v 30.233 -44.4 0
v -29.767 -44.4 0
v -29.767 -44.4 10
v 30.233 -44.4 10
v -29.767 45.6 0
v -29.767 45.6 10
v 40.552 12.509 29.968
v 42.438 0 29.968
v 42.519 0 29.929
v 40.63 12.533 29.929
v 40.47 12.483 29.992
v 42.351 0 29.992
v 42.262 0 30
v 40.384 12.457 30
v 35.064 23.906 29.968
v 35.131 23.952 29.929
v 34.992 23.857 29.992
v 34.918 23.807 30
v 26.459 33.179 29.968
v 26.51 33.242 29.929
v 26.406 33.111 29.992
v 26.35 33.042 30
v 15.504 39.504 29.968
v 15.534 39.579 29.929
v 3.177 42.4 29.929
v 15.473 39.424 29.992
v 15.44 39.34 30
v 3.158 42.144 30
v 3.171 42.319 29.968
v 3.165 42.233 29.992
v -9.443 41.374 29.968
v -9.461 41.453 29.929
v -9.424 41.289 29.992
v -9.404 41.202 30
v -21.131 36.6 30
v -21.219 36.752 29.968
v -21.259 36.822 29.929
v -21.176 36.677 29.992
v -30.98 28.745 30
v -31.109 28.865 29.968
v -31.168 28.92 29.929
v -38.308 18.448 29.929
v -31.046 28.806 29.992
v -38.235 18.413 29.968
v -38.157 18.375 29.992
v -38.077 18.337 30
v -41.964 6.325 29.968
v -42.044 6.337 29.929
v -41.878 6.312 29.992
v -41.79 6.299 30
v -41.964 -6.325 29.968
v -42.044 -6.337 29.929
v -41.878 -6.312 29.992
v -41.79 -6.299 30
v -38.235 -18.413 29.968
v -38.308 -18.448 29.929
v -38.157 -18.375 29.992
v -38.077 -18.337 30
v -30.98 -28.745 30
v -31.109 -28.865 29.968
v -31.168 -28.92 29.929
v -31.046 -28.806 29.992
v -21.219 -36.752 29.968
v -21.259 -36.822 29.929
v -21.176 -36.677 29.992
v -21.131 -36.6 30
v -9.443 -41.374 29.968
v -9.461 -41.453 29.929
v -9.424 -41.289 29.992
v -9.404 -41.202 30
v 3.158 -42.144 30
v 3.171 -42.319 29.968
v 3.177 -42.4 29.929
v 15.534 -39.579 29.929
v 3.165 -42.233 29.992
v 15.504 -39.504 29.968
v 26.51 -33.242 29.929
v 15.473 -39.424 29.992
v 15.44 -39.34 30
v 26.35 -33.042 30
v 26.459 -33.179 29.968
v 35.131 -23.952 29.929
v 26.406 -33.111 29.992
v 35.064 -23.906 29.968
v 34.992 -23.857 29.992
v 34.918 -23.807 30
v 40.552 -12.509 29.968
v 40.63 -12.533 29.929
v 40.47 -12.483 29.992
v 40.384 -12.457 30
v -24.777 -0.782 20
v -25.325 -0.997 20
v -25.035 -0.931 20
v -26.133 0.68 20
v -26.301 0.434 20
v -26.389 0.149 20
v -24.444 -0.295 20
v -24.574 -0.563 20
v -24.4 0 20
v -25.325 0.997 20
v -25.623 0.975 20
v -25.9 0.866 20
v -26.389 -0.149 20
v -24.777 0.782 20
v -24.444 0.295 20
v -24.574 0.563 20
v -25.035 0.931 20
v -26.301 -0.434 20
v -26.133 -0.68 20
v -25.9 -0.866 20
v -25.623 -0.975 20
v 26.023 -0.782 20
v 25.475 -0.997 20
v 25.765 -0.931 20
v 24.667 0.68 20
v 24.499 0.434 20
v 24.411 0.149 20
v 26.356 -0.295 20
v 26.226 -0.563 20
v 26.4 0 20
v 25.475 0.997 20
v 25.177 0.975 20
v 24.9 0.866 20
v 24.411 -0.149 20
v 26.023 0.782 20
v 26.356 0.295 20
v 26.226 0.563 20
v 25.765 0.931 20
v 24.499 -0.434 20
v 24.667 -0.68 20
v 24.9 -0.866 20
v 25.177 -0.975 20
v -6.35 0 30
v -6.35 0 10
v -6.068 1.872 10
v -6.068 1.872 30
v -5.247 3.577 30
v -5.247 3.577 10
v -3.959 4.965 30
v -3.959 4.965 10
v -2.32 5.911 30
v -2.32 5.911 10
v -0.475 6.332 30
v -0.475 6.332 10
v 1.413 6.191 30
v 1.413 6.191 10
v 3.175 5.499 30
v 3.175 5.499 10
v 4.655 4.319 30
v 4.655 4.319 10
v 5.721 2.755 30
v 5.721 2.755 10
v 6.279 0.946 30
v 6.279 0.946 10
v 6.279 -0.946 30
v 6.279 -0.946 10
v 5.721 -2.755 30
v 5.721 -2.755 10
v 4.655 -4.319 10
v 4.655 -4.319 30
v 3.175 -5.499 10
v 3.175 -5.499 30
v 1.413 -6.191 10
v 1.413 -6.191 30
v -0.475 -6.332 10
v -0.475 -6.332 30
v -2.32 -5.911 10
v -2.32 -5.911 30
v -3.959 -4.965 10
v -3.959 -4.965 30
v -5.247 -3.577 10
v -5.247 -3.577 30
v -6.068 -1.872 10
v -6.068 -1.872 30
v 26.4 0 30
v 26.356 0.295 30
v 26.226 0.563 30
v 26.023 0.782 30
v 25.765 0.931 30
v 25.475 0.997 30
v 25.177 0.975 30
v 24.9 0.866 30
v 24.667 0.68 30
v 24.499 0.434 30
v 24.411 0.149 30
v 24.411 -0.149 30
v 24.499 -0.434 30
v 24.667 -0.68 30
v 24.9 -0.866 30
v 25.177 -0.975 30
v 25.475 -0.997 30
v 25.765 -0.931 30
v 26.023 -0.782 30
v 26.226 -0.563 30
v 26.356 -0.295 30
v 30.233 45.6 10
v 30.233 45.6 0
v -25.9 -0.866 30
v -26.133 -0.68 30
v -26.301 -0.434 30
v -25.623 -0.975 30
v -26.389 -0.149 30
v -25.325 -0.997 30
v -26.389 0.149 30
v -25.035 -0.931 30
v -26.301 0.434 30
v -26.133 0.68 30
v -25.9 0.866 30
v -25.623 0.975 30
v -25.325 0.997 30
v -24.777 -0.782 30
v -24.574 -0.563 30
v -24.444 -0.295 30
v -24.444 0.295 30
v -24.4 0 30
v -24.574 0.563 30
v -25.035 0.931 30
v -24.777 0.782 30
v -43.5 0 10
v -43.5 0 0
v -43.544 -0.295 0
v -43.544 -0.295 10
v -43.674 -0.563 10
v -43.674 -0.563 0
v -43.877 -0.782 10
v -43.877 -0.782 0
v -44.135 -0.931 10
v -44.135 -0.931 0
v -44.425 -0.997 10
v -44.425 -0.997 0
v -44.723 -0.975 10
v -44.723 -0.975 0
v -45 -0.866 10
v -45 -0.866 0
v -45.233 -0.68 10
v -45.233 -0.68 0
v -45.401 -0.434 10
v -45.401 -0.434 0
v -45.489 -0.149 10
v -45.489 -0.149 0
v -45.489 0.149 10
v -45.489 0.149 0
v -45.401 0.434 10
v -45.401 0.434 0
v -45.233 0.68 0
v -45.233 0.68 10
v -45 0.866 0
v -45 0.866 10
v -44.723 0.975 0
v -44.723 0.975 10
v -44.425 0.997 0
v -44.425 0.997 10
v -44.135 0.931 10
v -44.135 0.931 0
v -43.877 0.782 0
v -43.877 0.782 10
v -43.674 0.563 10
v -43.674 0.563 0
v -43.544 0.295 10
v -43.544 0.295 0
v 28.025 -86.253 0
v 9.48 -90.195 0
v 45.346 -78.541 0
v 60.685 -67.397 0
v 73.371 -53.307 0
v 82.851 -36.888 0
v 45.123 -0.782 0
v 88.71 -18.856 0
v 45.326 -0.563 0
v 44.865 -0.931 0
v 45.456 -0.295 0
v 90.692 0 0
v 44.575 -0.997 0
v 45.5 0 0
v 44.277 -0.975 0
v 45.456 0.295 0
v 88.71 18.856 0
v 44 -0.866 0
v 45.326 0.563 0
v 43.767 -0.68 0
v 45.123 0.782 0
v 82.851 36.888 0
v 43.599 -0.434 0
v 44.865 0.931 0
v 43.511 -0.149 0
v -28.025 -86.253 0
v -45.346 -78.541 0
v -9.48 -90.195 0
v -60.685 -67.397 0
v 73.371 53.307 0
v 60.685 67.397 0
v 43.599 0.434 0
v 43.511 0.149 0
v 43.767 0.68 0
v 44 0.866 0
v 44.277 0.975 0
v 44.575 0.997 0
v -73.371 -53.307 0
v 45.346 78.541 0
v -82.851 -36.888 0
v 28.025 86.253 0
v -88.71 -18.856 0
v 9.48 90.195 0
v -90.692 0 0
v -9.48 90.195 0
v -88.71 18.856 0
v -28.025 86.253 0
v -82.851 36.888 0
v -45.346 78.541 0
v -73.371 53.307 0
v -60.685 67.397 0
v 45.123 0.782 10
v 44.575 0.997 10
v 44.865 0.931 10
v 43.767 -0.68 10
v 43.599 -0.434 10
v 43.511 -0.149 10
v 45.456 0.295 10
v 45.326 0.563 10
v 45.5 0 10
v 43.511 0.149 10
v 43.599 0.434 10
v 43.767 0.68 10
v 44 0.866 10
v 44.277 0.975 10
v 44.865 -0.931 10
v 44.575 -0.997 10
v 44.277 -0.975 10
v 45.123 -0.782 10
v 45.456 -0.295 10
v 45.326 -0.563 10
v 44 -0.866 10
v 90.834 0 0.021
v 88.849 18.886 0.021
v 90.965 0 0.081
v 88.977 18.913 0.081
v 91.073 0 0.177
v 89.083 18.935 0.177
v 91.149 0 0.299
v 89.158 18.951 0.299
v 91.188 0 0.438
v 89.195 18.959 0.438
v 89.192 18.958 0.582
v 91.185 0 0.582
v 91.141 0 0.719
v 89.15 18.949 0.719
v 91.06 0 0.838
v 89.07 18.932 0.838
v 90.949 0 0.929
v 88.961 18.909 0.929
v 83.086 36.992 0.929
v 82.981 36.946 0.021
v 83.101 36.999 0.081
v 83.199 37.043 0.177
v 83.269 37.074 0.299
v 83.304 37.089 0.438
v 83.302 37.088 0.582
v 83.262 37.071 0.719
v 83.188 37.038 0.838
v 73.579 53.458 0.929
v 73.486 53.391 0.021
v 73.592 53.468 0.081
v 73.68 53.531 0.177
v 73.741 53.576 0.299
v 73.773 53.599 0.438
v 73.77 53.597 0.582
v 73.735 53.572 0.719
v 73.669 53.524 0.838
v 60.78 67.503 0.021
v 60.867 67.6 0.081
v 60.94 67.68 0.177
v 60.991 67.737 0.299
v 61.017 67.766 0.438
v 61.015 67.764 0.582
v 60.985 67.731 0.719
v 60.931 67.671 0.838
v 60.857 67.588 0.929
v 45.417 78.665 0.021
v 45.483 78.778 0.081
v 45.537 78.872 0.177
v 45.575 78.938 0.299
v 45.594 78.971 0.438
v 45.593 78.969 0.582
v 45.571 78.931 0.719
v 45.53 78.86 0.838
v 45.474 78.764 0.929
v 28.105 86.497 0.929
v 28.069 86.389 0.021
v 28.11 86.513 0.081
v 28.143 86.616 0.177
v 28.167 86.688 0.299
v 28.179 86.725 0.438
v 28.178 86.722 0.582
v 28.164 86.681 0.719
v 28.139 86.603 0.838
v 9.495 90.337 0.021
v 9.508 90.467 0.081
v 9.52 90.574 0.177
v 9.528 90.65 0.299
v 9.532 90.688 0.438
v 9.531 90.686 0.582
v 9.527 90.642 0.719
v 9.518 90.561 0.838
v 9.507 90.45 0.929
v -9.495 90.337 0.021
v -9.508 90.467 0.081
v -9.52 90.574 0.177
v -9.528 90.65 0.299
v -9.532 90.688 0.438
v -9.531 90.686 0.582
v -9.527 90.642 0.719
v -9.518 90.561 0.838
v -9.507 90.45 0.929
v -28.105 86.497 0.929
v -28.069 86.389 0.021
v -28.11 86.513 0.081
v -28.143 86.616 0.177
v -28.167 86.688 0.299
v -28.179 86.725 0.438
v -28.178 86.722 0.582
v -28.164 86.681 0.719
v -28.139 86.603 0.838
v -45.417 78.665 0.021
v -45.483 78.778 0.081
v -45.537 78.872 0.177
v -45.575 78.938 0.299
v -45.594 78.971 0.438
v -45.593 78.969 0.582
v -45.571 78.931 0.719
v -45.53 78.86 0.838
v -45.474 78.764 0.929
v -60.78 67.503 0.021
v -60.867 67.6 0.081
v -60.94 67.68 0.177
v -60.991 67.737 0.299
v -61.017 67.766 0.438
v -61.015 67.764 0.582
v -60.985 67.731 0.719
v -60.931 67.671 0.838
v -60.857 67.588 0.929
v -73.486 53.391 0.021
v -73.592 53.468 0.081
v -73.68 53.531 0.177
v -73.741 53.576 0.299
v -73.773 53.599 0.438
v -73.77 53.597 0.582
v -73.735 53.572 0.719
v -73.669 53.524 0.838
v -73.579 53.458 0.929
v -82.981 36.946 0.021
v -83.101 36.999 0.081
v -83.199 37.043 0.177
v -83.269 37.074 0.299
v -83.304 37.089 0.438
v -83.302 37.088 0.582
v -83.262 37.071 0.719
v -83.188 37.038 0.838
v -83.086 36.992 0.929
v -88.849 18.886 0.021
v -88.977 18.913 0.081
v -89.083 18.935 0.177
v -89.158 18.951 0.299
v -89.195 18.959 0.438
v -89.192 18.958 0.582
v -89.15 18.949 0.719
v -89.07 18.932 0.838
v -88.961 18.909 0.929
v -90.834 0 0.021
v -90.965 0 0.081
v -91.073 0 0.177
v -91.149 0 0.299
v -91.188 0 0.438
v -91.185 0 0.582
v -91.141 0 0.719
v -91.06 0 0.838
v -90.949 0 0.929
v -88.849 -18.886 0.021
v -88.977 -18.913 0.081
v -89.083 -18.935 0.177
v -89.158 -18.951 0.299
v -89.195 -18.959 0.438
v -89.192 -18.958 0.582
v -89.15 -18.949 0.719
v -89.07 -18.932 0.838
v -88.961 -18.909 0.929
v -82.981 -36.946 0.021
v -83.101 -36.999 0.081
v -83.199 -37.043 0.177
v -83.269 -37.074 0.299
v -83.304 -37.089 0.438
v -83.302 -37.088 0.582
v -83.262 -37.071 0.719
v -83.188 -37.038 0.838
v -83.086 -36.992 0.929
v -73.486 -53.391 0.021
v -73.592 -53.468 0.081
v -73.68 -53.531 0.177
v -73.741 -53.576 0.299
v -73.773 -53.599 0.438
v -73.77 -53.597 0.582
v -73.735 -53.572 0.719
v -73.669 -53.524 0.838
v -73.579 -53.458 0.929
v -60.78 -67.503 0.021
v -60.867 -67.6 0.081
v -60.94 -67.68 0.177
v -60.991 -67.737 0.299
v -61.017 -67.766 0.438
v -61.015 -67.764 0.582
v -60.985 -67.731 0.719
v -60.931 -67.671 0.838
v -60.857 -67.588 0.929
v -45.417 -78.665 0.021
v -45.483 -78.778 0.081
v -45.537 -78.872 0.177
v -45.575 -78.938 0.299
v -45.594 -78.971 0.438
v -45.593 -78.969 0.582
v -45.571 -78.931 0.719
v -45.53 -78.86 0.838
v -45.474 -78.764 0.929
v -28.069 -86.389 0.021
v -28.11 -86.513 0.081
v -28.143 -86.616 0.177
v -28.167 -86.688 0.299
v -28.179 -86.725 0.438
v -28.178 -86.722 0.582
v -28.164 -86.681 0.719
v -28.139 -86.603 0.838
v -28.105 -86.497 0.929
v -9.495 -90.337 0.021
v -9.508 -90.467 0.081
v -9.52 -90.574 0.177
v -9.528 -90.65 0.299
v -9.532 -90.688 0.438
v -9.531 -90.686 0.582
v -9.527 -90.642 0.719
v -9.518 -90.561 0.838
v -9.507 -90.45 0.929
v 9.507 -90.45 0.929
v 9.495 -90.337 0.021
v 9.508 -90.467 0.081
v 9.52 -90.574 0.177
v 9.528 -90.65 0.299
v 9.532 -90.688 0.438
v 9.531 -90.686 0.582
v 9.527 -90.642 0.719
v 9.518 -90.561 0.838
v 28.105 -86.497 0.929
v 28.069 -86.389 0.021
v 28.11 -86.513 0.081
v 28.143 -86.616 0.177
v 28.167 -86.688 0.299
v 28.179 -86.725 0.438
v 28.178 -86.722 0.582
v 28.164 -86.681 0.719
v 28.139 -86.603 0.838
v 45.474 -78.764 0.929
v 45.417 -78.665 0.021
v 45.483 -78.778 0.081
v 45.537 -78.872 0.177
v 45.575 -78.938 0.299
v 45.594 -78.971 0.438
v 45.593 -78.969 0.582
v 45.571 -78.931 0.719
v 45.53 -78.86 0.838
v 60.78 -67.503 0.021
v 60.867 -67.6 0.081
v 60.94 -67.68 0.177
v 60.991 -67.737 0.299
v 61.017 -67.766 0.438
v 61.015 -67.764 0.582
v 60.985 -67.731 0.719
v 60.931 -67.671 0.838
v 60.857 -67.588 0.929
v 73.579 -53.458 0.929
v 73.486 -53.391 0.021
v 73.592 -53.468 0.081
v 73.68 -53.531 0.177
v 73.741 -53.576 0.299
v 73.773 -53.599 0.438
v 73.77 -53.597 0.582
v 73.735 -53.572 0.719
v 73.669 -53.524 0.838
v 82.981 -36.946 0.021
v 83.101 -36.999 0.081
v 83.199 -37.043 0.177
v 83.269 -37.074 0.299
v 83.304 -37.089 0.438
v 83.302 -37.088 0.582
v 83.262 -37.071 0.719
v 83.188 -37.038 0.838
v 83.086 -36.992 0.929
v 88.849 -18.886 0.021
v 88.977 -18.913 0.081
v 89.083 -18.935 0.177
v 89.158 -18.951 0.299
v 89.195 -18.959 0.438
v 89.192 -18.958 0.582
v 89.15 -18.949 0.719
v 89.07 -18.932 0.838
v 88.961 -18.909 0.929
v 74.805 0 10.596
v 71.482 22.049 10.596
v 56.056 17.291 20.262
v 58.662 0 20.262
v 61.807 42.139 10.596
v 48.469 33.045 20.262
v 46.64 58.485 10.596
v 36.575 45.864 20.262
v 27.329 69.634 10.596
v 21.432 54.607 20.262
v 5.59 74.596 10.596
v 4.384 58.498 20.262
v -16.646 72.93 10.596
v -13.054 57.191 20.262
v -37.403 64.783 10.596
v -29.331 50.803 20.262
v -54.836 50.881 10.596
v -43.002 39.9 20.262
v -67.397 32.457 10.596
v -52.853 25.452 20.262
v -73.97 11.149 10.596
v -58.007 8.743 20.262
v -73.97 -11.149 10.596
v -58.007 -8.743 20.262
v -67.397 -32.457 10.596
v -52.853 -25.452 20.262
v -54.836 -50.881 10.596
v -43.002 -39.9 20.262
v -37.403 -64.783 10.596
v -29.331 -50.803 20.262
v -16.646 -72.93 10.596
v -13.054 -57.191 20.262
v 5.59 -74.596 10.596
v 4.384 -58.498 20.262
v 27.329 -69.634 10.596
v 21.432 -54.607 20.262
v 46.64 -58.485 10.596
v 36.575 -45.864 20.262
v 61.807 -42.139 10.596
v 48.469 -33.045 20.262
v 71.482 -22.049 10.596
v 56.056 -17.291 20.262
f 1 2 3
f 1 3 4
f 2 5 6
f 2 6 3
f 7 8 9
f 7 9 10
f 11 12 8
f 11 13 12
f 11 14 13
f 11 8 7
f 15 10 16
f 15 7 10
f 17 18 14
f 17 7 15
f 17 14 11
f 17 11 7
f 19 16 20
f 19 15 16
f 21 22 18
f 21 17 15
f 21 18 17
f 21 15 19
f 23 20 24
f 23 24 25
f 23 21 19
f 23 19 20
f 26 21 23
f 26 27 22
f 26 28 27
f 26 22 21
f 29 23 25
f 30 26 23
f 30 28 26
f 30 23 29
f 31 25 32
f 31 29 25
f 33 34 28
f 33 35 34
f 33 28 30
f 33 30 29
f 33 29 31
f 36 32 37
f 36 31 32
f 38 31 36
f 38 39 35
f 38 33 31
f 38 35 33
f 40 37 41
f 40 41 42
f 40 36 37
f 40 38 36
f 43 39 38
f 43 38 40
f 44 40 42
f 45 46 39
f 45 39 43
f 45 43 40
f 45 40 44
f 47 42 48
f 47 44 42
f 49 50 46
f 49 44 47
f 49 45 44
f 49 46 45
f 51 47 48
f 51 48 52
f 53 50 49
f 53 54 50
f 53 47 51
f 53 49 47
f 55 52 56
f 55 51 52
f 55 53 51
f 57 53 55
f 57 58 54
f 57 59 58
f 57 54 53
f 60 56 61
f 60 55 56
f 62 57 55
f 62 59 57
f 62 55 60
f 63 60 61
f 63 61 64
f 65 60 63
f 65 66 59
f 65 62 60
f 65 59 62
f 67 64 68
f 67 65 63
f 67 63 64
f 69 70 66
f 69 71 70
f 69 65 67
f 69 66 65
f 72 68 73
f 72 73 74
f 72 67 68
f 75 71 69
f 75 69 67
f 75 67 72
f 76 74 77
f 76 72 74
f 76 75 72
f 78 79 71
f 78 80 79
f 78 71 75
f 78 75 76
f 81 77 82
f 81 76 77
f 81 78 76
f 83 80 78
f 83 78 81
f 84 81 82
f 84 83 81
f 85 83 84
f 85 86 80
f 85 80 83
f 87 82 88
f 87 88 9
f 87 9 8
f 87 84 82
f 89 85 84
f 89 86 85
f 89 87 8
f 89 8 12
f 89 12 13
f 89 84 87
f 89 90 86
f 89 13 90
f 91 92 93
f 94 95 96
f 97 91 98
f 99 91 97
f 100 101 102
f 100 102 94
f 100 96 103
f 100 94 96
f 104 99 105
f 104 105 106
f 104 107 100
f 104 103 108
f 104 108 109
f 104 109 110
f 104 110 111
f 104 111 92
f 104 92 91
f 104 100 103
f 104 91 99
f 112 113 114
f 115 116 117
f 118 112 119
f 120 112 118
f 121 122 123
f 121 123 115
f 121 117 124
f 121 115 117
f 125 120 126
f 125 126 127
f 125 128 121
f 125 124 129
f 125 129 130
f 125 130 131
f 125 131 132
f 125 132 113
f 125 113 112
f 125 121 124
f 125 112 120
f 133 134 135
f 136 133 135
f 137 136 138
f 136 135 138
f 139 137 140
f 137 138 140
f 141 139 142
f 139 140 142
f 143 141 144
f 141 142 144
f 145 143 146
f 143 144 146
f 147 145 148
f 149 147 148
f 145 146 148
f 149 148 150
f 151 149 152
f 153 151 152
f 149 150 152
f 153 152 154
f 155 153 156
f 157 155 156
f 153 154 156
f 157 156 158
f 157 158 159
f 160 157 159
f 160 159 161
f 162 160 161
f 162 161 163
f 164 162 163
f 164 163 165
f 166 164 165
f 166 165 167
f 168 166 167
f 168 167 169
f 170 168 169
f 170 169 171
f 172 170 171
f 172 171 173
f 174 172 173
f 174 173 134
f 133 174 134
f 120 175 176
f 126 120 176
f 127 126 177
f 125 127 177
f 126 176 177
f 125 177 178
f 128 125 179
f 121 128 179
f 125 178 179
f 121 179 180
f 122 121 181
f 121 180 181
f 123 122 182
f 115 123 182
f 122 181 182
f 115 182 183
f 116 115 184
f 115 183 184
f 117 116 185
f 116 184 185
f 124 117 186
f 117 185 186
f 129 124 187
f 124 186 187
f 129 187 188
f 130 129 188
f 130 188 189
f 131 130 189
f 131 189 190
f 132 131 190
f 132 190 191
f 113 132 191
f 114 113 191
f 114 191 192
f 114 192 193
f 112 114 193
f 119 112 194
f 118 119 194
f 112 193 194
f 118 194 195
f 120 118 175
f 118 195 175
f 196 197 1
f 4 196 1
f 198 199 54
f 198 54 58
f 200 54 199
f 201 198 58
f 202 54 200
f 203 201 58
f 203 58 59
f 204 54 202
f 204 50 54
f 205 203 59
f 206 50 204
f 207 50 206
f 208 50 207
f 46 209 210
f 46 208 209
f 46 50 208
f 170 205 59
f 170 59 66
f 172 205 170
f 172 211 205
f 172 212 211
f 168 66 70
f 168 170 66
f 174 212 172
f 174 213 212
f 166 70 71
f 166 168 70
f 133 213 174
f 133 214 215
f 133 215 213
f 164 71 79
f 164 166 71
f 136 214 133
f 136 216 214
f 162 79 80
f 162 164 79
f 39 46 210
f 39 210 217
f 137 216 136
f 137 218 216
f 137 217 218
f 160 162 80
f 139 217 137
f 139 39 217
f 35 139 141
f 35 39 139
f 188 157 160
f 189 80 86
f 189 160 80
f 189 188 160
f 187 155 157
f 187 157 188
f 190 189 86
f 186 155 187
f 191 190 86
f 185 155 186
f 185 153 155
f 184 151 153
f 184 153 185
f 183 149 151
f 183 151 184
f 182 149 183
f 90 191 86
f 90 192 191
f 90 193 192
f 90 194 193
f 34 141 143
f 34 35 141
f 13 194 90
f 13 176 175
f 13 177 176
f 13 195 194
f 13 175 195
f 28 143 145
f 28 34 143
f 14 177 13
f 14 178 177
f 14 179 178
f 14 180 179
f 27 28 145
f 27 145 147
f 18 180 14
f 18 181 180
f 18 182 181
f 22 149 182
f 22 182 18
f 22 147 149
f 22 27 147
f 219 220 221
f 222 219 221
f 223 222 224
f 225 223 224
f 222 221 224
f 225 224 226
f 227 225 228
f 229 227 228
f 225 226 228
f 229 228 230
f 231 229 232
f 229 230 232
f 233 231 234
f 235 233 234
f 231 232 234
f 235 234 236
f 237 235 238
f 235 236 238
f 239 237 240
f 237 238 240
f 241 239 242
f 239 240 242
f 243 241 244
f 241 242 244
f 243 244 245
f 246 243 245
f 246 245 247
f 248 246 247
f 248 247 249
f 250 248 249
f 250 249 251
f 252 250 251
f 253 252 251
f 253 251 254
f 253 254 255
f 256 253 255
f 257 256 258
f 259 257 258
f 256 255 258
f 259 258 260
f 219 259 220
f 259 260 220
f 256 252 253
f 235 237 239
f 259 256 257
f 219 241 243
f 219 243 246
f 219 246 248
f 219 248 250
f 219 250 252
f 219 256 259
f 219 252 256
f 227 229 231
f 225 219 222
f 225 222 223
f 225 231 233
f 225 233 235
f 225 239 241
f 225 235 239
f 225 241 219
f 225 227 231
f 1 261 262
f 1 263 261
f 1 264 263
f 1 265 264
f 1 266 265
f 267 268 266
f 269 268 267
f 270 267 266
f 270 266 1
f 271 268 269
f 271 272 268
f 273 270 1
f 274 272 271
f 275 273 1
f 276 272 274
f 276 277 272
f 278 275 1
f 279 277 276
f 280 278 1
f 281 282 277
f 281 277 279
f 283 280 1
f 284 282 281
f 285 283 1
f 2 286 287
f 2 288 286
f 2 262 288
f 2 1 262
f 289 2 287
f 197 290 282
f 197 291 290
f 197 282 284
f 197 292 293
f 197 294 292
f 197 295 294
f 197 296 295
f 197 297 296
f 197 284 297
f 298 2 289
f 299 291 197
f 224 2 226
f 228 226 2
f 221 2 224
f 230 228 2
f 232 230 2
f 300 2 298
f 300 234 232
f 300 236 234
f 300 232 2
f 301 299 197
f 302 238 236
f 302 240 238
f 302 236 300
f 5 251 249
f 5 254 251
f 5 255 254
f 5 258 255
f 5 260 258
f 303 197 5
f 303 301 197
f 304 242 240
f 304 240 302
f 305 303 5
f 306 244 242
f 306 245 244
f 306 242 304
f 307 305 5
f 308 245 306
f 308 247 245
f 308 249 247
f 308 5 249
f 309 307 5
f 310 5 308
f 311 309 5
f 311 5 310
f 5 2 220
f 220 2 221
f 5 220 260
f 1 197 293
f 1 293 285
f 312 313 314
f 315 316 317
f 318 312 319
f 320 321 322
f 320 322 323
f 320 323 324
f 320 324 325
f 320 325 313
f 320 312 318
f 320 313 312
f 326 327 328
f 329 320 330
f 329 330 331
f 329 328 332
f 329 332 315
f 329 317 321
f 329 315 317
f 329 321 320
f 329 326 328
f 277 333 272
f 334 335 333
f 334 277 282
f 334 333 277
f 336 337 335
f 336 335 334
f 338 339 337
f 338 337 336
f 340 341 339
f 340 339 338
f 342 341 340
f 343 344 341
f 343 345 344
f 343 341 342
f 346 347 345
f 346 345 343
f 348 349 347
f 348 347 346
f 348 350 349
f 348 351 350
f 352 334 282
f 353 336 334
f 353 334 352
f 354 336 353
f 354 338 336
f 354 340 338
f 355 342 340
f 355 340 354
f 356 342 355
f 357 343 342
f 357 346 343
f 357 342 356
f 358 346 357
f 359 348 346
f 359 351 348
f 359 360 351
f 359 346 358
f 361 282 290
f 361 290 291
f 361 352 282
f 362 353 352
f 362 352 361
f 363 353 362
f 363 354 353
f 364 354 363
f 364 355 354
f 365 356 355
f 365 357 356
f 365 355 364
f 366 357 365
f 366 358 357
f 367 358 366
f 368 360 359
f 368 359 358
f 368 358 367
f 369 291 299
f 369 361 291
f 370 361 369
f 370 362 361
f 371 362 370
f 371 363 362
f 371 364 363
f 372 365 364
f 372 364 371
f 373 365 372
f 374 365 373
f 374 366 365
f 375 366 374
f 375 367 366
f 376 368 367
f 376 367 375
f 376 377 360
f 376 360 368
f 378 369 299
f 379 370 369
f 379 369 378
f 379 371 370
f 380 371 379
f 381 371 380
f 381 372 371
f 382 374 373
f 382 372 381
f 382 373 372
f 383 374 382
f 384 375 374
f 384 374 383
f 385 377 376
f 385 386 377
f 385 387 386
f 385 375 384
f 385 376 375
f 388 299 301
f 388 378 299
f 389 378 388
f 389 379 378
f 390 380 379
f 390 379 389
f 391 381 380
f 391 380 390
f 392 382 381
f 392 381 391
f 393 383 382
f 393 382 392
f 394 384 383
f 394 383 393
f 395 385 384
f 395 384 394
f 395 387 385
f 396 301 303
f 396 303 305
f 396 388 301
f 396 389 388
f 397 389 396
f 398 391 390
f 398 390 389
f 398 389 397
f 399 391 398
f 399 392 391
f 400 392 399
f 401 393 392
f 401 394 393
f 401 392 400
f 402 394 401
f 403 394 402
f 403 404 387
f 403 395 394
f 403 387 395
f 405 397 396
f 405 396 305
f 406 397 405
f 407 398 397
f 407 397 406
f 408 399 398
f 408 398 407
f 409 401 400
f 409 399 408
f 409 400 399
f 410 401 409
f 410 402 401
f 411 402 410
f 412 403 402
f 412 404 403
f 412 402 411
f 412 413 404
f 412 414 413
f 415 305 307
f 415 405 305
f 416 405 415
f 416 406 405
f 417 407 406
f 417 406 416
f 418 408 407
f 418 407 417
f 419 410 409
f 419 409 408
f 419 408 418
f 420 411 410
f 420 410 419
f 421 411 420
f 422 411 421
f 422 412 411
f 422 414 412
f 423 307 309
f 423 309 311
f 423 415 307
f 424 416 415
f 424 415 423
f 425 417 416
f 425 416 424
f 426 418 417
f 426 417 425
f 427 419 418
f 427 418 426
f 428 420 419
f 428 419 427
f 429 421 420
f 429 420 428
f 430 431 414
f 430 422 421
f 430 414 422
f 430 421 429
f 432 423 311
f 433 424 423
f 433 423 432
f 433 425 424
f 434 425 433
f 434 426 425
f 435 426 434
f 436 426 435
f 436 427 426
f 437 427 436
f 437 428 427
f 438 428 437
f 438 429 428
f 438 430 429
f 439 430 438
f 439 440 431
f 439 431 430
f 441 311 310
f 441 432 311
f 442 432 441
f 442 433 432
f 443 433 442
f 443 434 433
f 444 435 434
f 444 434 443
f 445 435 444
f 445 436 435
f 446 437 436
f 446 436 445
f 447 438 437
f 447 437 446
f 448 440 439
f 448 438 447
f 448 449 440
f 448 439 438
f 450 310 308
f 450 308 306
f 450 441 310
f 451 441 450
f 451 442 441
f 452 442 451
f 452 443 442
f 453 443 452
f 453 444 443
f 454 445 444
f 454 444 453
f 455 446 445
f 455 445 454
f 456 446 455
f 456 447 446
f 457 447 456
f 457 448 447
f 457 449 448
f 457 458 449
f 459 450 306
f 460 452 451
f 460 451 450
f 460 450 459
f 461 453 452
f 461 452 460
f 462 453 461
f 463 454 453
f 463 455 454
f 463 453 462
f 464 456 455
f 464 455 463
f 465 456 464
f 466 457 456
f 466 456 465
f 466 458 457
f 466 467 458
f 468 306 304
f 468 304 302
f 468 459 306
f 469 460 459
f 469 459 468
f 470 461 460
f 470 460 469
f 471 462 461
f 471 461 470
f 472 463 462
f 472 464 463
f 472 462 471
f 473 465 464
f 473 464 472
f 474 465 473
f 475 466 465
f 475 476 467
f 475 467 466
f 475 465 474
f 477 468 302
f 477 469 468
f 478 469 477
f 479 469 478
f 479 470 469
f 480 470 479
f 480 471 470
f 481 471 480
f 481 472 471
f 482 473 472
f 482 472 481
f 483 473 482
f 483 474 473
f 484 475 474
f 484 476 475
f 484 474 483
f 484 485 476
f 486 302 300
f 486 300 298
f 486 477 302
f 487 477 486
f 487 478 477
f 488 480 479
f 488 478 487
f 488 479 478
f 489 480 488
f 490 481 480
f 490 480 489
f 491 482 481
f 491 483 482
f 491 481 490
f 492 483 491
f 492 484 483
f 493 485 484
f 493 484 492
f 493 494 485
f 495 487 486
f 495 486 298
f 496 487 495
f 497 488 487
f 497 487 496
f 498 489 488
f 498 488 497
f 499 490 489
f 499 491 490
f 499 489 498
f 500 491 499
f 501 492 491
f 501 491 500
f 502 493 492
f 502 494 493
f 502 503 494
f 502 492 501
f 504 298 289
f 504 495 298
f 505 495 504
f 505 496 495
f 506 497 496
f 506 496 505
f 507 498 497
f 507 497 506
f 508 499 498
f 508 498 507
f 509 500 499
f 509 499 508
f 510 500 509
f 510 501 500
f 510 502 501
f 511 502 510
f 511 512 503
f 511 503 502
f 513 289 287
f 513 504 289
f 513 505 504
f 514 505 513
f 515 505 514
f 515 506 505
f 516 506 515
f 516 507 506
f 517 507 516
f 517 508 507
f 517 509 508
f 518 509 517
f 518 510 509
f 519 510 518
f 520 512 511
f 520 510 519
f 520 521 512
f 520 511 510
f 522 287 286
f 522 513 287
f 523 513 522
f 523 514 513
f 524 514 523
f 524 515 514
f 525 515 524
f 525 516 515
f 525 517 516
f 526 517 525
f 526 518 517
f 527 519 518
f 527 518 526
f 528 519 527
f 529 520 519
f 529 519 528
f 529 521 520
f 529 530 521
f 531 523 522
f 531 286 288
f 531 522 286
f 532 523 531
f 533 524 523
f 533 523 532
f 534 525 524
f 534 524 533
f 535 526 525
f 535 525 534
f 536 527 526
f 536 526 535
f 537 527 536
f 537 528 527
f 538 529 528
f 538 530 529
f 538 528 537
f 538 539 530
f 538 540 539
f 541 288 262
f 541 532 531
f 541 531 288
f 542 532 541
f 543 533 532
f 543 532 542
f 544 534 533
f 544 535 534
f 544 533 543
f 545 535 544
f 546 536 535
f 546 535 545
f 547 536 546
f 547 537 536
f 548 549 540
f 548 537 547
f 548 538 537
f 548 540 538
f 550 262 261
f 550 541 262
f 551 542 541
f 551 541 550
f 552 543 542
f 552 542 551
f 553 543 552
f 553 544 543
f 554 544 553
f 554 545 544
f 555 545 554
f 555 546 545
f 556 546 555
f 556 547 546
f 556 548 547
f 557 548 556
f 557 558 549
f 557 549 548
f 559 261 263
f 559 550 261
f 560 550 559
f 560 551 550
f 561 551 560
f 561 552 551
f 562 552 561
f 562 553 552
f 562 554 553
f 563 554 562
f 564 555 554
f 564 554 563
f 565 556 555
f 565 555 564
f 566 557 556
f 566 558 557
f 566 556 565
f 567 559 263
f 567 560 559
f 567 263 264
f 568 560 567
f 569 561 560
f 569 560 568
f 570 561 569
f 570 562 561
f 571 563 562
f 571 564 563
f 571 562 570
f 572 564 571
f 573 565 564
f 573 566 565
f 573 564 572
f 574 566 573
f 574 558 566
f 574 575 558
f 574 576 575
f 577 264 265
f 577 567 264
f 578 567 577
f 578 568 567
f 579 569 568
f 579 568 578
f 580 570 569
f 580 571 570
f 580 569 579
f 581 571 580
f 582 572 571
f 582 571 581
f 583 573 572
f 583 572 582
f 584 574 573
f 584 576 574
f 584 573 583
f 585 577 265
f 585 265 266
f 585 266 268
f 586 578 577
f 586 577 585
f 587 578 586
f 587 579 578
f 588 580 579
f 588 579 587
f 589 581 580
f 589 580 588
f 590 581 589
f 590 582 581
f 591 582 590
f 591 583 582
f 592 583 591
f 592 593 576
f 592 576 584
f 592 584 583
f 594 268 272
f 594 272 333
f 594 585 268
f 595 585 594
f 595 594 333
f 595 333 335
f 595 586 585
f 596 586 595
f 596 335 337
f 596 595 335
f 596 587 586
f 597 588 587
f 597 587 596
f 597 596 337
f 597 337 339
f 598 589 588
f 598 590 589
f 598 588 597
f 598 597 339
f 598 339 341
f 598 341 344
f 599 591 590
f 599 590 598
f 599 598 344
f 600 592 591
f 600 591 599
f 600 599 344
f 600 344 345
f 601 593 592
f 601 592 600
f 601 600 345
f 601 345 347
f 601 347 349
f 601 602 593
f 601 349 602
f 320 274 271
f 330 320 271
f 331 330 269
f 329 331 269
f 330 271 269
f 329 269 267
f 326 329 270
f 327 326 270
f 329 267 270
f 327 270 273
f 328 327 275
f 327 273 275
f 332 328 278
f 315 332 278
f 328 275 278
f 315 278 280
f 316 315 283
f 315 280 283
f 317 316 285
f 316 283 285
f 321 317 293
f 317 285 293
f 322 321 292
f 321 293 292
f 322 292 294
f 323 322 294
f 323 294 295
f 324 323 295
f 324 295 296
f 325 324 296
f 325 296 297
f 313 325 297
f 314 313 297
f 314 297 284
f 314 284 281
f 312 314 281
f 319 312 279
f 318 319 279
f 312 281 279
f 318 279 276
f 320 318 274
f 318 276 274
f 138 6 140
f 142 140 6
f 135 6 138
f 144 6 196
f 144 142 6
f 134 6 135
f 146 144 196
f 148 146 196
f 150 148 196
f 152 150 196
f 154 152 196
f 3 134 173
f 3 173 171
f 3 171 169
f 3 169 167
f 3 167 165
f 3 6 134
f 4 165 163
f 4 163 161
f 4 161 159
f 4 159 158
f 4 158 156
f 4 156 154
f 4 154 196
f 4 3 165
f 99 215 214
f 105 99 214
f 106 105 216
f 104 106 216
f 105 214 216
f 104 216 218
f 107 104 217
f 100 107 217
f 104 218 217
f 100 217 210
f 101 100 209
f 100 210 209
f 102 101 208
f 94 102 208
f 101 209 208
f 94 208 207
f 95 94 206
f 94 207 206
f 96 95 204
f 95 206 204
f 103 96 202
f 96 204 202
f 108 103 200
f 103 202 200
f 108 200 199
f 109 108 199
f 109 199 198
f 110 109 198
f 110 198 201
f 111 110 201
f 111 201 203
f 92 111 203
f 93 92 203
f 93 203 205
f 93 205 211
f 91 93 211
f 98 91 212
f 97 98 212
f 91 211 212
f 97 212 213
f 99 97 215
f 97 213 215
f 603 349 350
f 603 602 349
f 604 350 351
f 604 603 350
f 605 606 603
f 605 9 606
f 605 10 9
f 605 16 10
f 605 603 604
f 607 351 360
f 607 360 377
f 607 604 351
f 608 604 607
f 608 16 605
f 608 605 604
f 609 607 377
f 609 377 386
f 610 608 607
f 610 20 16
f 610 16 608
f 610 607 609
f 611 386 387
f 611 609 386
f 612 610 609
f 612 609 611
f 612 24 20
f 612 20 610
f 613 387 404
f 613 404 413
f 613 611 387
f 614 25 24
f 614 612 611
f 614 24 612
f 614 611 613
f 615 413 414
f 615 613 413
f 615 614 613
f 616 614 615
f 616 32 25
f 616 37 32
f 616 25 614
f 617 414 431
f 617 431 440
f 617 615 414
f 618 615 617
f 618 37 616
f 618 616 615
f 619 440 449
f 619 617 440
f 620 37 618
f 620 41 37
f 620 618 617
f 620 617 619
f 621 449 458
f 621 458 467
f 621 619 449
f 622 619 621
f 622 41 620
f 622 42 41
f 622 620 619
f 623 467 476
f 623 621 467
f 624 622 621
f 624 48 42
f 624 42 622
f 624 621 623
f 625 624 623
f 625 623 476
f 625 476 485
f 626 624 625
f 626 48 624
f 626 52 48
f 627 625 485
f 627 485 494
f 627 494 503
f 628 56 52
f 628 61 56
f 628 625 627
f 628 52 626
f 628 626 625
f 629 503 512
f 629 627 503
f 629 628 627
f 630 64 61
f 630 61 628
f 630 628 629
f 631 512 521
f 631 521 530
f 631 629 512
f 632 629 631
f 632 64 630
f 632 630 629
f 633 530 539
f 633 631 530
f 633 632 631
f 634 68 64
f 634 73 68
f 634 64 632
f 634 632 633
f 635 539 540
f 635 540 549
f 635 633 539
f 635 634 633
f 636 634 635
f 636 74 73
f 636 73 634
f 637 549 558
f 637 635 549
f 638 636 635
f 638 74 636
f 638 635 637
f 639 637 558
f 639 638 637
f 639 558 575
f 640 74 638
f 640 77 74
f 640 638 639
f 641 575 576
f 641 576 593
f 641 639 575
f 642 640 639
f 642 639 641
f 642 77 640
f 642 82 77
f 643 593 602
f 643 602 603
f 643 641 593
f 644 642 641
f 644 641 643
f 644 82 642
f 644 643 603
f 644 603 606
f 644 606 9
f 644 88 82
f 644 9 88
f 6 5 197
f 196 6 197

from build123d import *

# Parameters (mm, degrees)
F3_D     = 12.7
F4_W     = 60
F4_H     = 90
F4_R     = 6.35
F5_DEPTH = 10
F6_R     = 1
F7_DEPTH = 10
F8_R     = 1
F9_DEPTH = 10
F10_R    = 0.5


with BuildPart() as f1:
    # F0 (on Front) → F1 (revolve)
    with BuildSketch(Plane.XZ):
        Polygon((0, 30), (0, 0), (92.5, 0), (42.4, 30), align=None)
    revolve(axis=Axis((0, 0, 15), (0, 0, 1)))

    # F3 (through all)
    with Locations(Plane.XY.offset(30)):
        with Locations((0, 0)):
            Hole(F3_D / 2)

    # F4 (on face) → F5 (cut)
    with BuildSketch(Plane(origin=(0, 0, 0), x_dir=(1, 0, 0), z_dir=(0, 0, -1))):
        with Locations((0.233456, -0.599967)):
            Rectangle(F4_W, F4_H)
        Circle(F4_R, mode=Mode.SUBTRACT)
    extrude(amount=-F5_DEPTH, mode=Mode.SUBTRACT)

    # F6 (on face) → F7 (cut)
    with BuildSketch(Plane(origin=(0, 0, 0), x_dir=(1, 0, 0), z_dir=(0, 0, -1))):
        with Locations((-44.5, 0)):
            Circle(F6_R)
        with Locations((44.5, 0)):
            Circle(F6_R)
    extrude(amount=-F7_DEPTH, mode=Mode.SUBTRACT)

    # F8 (on face) → F9 (cut)
    with BuildSketch(Plane.XY.offset(30)):
        with Locations((-25.4, 0)):
            Circle(F8_R)
        with Locations((25.4, 0)):
            Circle(F8_R)
    extrude(amount=-F9_DEPTH, mode=Mode.SUBTRACT)

    # F10
    f10_edges = [f1.edges().sort_by_distance(p)[0] for p in [
        (-92.5, 0, 0),
        (-42.4, 0, 30),
    ]]
    fillet(f10_edges, radius=F10_R)


solid = f1.part
